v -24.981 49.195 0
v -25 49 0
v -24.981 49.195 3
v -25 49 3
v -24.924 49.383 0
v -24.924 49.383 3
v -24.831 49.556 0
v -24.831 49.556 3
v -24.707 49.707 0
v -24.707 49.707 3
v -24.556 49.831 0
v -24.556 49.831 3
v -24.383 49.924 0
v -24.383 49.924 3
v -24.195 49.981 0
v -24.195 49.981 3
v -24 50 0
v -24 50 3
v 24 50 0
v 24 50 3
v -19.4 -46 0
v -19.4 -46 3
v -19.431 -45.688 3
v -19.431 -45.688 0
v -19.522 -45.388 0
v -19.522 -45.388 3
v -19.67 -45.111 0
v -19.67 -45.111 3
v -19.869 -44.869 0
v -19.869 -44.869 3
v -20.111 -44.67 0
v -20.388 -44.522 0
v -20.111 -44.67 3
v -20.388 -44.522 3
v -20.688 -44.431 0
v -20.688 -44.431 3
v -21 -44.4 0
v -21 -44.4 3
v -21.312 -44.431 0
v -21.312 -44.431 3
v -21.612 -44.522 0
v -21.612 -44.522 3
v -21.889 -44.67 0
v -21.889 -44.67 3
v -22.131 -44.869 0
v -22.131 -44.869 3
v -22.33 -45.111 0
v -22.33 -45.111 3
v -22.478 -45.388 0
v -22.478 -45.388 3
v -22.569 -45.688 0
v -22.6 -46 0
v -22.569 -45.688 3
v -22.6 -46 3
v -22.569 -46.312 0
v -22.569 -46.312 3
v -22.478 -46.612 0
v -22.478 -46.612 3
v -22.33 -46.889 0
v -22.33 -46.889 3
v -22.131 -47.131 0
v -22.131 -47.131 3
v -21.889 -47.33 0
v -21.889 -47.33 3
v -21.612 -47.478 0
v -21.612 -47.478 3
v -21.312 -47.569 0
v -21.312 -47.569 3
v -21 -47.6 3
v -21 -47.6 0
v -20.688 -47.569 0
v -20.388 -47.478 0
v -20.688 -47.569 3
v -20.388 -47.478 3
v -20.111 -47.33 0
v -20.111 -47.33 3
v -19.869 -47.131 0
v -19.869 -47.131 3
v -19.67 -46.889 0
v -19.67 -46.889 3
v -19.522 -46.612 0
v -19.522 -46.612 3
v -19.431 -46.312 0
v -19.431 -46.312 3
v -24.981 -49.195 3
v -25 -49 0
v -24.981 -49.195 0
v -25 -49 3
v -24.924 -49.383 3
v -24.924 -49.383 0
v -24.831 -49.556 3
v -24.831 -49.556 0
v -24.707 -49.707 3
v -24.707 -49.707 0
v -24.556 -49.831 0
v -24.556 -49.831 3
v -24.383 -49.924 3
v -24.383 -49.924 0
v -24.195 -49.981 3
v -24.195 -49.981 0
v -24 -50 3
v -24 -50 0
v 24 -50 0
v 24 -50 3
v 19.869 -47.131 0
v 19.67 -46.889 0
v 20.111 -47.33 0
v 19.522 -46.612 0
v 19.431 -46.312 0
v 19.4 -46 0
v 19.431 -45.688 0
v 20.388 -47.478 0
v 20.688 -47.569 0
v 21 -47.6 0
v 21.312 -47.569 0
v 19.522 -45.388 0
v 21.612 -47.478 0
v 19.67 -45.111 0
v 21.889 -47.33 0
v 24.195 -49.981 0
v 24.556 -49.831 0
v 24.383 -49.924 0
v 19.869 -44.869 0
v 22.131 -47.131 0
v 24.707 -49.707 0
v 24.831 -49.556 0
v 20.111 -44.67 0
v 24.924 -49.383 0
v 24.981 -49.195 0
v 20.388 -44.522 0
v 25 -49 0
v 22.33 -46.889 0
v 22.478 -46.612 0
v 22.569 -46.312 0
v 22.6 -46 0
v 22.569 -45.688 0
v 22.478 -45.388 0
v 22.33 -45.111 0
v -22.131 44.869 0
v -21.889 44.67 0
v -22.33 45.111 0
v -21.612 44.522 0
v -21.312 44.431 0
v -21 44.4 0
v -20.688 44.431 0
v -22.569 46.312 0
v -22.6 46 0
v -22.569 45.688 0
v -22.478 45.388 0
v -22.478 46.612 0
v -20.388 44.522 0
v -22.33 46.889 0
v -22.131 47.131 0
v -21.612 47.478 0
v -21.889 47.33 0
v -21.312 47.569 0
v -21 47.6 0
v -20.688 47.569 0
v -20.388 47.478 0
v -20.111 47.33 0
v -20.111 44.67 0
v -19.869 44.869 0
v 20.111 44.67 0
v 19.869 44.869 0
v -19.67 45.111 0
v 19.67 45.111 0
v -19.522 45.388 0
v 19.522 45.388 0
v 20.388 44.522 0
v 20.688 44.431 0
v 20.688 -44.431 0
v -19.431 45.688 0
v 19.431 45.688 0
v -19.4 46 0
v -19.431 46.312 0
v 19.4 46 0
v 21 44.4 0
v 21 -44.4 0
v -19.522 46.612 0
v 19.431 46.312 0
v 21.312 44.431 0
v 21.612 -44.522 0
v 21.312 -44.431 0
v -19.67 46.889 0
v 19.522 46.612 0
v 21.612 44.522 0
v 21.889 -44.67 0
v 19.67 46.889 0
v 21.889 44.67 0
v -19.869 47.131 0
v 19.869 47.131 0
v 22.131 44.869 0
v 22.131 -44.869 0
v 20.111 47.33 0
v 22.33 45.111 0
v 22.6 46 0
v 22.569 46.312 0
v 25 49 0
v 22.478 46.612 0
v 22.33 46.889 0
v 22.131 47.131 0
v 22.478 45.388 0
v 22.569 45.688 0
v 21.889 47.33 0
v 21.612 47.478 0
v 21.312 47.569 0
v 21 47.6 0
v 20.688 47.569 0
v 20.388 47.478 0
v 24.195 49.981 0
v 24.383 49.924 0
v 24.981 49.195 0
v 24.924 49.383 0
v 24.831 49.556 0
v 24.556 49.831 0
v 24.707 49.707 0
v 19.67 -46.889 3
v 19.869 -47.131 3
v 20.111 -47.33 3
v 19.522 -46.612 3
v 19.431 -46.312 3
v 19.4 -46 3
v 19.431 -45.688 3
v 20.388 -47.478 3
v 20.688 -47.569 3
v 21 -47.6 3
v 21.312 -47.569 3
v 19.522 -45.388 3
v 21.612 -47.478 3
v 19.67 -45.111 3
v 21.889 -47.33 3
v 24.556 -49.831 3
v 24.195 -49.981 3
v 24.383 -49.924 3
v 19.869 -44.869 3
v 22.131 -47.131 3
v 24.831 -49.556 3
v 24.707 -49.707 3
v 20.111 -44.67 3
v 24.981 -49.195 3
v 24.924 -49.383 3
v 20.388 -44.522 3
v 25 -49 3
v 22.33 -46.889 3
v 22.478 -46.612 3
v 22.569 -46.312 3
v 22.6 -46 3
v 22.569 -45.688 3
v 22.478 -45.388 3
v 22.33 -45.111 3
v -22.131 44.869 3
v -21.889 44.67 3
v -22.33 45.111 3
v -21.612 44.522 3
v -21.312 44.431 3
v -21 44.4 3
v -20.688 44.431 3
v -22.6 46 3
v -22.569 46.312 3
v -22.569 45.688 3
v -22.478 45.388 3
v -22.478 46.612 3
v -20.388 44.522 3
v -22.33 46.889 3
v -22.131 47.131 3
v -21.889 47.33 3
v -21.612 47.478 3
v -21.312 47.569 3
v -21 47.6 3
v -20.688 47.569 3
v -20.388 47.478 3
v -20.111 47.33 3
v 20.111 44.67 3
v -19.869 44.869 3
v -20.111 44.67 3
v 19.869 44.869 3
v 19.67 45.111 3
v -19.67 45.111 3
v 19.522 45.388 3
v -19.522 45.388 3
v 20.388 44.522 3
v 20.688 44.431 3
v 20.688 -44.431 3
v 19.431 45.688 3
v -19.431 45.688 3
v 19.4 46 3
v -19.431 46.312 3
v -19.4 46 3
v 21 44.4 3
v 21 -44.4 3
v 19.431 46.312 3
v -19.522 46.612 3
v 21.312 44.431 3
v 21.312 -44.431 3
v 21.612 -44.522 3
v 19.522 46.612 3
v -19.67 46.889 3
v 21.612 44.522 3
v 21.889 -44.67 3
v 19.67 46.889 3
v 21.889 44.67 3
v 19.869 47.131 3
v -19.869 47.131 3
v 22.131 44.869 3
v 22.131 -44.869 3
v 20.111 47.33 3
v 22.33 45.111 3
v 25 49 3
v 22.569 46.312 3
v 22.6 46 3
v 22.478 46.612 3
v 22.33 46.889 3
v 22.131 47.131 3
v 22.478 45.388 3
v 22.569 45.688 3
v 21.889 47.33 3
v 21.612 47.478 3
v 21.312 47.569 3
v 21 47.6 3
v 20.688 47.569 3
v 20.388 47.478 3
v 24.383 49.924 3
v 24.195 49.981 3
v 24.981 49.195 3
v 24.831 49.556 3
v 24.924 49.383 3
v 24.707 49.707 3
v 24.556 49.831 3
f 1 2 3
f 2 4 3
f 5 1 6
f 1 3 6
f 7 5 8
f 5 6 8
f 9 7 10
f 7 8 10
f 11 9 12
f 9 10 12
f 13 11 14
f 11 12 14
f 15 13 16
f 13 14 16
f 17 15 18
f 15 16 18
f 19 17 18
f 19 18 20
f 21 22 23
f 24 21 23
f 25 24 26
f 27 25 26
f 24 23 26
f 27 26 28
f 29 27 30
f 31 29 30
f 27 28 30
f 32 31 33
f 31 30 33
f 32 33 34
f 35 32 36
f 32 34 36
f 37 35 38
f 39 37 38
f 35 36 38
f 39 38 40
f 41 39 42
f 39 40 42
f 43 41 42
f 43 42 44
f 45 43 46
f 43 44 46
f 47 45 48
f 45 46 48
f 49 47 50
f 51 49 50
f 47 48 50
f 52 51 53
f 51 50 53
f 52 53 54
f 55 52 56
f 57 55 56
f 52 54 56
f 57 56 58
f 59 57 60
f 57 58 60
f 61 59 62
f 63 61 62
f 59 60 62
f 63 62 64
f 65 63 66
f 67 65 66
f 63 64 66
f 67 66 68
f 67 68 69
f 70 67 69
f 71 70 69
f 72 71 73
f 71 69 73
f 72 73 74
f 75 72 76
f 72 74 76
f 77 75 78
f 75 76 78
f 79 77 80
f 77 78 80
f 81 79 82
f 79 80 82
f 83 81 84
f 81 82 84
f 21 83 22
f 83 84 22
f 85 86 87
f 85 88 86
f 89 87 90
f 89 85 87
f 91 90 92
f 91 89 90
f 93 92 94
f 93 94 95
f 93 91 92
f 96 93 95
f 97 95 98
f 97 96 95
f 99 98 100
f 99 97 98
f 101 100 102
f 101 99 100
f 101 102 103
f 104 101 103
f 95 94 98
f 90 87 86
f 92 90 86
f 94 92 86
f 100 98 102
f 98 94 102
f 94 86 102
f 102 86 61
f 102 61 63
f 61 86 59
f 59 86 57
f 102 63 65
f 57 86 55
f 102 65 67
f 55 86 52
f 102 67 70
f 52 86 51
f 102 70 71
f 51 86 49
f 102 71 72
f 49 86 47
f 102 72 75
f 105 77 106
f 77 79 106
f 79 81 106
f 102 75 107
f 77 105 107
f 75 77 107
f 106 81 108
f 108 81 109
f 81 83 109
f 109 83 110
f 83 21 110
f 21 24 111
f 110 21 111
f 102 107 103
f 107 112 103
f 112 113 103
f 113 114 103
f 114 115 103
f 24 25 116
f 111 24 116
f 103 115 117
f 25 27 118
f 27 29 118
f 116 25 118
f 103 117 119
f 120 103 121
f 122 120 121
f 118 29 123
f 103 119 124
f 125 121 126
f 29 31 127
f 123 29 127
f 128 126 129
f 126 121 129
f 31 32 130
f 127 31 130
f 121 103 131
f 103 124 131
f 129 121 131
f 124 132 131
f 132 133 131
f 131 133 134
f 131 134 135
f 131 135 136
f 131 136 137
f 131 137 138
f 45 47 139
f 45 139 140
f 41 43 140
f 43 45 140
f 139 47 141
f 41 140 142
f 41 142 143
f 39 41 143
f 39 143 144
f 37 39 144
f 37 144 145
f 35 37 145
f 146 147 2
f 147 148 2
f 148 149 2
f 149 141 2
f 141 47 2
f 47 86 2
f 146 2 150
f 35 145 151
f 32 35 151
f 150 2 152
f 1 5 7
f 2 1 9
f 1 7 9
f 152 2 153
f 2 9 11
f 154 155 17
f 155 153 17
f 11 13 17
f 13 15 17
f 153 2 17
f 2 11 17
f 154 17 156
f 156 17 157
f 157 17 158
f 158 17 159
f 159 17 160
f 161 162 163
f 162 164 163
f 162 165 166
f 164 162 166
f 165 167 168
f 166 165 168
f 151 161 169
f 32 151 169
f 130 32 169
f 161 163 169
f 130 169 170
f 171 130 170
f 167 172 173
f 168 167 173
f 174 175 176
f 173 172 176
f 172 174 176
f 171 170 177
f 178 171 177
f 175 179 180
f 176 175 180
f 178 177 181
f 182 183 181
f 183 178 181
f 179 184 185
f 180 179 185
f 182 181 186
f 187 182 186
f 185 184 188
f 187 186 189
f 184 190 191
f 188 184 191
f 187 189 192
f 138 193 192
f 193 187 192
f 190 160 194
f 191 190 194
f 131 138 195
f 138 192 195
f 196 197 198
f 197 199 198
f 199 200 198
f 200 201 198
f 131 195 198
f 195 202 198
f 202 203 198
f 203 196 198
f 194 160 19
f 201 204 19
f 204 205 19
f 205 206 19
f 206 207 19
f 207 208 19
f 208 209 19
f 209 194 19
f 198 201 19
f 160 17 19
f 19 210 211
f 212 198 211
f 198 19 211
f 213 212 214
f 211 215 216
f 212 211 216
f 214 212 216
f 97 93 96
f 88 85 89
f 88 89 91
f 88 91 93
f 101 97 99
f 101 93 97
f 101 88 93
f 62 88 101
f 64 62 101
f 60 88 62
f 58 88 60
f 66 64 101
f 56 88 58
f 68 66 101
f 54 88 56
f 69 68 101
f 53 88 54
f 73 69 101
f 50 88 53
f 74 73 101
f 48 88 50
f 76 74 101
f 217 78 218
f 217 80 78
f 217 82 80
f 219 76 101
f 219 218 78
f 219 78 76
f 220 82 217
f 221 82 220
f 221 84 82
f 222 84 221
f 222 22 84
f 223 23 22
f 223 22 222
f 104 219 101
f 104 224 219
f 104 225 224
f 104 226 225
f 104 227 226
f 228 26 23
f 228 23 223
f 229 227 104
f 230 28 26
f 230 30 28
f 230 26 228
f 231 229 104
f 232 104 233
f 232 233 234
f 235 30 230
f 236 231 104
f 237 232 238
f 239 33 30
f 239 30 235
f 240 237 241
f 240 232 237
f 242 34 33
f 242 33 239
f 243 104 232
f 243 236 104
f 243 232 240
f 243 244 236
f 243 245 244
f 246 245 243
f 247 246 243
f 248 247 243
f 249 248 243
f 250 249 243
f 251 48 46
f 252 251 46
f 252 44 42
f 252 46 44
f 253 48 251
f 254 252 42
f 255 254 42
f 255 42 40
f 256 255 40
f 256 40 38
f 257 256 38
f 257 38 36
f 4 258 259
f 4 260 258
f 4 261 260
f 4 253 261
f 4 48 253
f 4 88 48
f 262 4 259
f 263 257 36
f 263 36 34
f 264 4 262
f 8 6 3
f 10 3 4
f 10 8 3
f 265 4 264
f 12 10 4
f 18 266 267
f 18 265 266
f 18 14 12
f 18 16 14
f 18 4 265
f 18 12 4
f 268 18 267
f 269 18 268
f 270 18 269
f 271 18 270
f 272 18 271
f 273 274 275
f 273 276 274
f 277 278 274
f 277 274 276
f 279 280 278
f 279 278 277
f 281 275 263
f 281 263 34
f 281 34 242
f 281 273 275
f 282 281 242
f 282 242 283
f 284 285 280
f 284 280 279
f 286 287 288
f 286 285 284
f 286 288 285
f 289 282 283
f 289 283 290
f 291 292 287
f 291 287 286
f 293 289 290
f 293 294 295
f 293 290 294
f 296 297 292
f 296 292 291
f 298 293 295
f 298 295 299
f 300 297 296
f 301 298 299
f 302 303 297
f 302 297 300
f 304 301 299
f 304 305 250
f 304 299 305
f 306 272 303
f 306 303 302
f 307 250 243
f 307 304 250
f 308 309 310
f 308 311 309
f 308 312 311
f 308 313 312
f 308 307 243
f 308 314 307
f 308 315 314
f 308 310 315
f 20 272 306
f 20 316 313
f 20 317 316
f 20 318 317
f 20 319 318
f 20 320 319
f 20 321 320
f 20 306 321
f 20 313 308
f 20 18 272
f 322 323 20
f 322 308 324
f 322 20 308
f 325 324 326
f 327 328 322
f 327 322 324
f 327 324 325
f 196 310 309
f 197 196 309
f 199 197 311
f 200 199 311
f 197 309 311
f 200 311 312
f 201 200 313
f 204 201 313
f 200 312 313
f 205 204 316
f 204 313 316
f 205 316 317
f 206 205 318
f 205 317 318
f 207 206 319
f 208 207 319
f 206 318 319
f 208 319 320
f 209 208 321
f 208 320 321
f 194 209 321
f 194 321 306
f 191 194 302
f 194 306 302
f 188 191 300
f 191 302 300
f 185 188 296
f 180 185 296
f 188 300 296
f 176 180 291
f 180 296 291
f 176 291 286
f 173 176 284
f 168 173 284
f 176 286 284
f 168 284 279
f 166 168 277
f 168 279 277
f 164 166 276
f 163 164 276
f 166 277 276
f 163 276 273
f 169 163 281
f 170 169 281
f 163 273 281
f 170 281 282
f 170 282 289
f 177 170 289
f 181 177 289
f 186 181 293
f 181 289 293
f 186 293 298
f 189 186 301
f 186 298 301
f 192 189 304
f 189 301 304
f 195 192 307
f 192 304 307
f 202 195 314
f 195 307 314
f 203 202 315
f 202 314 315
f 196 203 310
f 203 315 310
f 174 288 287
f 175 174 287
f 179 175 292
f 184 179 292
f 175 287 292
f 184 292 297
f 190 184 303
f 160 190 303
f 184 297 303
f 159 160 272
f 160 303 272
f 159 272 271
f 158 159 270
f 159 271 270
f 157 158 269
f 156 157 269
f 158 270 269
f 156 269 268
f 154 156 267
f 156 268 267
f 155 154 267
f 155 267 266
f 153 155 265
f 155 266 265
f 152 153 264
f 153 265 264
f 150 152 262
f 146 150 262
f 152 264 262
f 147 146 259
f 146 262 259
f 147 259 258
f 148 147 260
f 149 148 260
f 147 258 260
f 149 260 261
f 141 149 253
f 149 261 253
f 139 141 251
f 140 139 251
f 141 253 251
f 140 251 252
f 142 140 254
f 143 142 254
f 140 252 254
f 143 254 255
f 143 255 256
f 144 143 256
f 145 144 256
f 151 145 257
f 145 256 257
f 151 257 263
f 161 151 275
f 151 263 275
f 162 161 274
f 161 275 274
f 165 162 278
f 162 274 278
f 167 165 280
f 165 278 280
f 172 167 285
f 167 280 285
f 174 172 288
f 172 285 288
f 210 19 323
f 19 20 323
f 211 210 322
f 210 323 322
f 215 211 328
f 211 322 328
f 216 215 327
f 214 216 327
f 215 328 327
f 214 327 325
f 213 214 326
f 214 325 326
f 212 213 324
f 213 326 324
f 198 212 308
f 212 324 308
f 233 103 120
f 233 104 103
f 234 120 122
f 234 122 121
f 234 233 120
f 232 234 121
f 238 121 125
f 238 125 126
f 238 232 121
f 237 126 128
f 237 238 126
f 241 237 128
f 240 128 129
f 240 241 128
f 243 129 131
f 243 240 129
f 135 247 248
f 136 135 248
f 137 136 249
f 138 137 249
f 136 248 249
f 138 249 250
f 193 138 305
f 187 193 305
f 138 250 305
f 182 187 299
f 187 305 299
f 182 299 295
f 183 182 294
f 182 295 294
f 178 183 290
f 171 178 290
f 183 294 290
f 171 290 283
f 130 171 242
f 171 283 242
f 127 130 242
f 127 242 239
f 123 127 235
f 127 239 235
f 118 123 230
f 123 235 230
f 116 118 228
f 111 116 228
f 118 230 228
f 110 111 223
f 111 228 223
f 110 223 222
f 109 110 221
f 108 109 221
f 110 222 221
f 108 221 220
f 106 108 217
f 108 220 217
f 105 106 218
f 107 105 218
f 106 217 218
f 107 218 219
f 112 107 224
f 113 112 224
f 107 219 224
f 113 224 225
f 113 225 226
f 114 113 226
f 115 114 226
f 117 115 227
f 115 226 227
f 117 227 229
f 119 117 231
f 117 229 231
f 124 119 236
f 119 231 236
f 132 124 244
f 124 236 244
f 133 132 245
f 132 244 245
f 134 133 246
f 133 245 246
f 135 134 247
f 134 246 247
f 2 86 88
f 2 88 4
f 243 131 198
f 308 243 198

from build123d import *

# Parameters (mm, degrees)
SKETCH_W     = 50
SKETCH_H     = 100
PAD_DEPTH    = 3
SKETCH001_R  = 1.6
POCKET_DEPTH = 3
FILLET_R     = 1


with BuildPart() as part:
    # Sketch → Pad (new body)
    with BuildSketch(Plane.XY):
        Rectangle(SKETCH_W, SKETCH_H)
    extrude(amount=PAD_DEPTH)

    # Sketch001 (on Face6 of Pad) → Pocket (cut)
    with BuildSketch(Plane.XY.offset(3)):
        with Locations((-21, 46)):
            Circle(SKETCH001_R)
        with Locations((21, 46)):
            Circle(SKETCH001_R)
        with Locations((-21, -46)):
            Circle(SKETCH001_R)
        with Locations((21, -46)):
            Circle(SKETCH001_R)
    extrude(amount=-POCKET_DEPTH, mode=Mode.SUBTRACT)

    # Fillet
    fillet_edges = [part.edges().sort_by_distance(p)[0] for p in [
        (-25, 50, 1.5),
        (25, 50, 1.5),
        (25, -50, 1.5),
        (-25, -50, 1.5),
    ]]
    fillet(fillet_edges, radius=FILLET_R)


solid = part.part
